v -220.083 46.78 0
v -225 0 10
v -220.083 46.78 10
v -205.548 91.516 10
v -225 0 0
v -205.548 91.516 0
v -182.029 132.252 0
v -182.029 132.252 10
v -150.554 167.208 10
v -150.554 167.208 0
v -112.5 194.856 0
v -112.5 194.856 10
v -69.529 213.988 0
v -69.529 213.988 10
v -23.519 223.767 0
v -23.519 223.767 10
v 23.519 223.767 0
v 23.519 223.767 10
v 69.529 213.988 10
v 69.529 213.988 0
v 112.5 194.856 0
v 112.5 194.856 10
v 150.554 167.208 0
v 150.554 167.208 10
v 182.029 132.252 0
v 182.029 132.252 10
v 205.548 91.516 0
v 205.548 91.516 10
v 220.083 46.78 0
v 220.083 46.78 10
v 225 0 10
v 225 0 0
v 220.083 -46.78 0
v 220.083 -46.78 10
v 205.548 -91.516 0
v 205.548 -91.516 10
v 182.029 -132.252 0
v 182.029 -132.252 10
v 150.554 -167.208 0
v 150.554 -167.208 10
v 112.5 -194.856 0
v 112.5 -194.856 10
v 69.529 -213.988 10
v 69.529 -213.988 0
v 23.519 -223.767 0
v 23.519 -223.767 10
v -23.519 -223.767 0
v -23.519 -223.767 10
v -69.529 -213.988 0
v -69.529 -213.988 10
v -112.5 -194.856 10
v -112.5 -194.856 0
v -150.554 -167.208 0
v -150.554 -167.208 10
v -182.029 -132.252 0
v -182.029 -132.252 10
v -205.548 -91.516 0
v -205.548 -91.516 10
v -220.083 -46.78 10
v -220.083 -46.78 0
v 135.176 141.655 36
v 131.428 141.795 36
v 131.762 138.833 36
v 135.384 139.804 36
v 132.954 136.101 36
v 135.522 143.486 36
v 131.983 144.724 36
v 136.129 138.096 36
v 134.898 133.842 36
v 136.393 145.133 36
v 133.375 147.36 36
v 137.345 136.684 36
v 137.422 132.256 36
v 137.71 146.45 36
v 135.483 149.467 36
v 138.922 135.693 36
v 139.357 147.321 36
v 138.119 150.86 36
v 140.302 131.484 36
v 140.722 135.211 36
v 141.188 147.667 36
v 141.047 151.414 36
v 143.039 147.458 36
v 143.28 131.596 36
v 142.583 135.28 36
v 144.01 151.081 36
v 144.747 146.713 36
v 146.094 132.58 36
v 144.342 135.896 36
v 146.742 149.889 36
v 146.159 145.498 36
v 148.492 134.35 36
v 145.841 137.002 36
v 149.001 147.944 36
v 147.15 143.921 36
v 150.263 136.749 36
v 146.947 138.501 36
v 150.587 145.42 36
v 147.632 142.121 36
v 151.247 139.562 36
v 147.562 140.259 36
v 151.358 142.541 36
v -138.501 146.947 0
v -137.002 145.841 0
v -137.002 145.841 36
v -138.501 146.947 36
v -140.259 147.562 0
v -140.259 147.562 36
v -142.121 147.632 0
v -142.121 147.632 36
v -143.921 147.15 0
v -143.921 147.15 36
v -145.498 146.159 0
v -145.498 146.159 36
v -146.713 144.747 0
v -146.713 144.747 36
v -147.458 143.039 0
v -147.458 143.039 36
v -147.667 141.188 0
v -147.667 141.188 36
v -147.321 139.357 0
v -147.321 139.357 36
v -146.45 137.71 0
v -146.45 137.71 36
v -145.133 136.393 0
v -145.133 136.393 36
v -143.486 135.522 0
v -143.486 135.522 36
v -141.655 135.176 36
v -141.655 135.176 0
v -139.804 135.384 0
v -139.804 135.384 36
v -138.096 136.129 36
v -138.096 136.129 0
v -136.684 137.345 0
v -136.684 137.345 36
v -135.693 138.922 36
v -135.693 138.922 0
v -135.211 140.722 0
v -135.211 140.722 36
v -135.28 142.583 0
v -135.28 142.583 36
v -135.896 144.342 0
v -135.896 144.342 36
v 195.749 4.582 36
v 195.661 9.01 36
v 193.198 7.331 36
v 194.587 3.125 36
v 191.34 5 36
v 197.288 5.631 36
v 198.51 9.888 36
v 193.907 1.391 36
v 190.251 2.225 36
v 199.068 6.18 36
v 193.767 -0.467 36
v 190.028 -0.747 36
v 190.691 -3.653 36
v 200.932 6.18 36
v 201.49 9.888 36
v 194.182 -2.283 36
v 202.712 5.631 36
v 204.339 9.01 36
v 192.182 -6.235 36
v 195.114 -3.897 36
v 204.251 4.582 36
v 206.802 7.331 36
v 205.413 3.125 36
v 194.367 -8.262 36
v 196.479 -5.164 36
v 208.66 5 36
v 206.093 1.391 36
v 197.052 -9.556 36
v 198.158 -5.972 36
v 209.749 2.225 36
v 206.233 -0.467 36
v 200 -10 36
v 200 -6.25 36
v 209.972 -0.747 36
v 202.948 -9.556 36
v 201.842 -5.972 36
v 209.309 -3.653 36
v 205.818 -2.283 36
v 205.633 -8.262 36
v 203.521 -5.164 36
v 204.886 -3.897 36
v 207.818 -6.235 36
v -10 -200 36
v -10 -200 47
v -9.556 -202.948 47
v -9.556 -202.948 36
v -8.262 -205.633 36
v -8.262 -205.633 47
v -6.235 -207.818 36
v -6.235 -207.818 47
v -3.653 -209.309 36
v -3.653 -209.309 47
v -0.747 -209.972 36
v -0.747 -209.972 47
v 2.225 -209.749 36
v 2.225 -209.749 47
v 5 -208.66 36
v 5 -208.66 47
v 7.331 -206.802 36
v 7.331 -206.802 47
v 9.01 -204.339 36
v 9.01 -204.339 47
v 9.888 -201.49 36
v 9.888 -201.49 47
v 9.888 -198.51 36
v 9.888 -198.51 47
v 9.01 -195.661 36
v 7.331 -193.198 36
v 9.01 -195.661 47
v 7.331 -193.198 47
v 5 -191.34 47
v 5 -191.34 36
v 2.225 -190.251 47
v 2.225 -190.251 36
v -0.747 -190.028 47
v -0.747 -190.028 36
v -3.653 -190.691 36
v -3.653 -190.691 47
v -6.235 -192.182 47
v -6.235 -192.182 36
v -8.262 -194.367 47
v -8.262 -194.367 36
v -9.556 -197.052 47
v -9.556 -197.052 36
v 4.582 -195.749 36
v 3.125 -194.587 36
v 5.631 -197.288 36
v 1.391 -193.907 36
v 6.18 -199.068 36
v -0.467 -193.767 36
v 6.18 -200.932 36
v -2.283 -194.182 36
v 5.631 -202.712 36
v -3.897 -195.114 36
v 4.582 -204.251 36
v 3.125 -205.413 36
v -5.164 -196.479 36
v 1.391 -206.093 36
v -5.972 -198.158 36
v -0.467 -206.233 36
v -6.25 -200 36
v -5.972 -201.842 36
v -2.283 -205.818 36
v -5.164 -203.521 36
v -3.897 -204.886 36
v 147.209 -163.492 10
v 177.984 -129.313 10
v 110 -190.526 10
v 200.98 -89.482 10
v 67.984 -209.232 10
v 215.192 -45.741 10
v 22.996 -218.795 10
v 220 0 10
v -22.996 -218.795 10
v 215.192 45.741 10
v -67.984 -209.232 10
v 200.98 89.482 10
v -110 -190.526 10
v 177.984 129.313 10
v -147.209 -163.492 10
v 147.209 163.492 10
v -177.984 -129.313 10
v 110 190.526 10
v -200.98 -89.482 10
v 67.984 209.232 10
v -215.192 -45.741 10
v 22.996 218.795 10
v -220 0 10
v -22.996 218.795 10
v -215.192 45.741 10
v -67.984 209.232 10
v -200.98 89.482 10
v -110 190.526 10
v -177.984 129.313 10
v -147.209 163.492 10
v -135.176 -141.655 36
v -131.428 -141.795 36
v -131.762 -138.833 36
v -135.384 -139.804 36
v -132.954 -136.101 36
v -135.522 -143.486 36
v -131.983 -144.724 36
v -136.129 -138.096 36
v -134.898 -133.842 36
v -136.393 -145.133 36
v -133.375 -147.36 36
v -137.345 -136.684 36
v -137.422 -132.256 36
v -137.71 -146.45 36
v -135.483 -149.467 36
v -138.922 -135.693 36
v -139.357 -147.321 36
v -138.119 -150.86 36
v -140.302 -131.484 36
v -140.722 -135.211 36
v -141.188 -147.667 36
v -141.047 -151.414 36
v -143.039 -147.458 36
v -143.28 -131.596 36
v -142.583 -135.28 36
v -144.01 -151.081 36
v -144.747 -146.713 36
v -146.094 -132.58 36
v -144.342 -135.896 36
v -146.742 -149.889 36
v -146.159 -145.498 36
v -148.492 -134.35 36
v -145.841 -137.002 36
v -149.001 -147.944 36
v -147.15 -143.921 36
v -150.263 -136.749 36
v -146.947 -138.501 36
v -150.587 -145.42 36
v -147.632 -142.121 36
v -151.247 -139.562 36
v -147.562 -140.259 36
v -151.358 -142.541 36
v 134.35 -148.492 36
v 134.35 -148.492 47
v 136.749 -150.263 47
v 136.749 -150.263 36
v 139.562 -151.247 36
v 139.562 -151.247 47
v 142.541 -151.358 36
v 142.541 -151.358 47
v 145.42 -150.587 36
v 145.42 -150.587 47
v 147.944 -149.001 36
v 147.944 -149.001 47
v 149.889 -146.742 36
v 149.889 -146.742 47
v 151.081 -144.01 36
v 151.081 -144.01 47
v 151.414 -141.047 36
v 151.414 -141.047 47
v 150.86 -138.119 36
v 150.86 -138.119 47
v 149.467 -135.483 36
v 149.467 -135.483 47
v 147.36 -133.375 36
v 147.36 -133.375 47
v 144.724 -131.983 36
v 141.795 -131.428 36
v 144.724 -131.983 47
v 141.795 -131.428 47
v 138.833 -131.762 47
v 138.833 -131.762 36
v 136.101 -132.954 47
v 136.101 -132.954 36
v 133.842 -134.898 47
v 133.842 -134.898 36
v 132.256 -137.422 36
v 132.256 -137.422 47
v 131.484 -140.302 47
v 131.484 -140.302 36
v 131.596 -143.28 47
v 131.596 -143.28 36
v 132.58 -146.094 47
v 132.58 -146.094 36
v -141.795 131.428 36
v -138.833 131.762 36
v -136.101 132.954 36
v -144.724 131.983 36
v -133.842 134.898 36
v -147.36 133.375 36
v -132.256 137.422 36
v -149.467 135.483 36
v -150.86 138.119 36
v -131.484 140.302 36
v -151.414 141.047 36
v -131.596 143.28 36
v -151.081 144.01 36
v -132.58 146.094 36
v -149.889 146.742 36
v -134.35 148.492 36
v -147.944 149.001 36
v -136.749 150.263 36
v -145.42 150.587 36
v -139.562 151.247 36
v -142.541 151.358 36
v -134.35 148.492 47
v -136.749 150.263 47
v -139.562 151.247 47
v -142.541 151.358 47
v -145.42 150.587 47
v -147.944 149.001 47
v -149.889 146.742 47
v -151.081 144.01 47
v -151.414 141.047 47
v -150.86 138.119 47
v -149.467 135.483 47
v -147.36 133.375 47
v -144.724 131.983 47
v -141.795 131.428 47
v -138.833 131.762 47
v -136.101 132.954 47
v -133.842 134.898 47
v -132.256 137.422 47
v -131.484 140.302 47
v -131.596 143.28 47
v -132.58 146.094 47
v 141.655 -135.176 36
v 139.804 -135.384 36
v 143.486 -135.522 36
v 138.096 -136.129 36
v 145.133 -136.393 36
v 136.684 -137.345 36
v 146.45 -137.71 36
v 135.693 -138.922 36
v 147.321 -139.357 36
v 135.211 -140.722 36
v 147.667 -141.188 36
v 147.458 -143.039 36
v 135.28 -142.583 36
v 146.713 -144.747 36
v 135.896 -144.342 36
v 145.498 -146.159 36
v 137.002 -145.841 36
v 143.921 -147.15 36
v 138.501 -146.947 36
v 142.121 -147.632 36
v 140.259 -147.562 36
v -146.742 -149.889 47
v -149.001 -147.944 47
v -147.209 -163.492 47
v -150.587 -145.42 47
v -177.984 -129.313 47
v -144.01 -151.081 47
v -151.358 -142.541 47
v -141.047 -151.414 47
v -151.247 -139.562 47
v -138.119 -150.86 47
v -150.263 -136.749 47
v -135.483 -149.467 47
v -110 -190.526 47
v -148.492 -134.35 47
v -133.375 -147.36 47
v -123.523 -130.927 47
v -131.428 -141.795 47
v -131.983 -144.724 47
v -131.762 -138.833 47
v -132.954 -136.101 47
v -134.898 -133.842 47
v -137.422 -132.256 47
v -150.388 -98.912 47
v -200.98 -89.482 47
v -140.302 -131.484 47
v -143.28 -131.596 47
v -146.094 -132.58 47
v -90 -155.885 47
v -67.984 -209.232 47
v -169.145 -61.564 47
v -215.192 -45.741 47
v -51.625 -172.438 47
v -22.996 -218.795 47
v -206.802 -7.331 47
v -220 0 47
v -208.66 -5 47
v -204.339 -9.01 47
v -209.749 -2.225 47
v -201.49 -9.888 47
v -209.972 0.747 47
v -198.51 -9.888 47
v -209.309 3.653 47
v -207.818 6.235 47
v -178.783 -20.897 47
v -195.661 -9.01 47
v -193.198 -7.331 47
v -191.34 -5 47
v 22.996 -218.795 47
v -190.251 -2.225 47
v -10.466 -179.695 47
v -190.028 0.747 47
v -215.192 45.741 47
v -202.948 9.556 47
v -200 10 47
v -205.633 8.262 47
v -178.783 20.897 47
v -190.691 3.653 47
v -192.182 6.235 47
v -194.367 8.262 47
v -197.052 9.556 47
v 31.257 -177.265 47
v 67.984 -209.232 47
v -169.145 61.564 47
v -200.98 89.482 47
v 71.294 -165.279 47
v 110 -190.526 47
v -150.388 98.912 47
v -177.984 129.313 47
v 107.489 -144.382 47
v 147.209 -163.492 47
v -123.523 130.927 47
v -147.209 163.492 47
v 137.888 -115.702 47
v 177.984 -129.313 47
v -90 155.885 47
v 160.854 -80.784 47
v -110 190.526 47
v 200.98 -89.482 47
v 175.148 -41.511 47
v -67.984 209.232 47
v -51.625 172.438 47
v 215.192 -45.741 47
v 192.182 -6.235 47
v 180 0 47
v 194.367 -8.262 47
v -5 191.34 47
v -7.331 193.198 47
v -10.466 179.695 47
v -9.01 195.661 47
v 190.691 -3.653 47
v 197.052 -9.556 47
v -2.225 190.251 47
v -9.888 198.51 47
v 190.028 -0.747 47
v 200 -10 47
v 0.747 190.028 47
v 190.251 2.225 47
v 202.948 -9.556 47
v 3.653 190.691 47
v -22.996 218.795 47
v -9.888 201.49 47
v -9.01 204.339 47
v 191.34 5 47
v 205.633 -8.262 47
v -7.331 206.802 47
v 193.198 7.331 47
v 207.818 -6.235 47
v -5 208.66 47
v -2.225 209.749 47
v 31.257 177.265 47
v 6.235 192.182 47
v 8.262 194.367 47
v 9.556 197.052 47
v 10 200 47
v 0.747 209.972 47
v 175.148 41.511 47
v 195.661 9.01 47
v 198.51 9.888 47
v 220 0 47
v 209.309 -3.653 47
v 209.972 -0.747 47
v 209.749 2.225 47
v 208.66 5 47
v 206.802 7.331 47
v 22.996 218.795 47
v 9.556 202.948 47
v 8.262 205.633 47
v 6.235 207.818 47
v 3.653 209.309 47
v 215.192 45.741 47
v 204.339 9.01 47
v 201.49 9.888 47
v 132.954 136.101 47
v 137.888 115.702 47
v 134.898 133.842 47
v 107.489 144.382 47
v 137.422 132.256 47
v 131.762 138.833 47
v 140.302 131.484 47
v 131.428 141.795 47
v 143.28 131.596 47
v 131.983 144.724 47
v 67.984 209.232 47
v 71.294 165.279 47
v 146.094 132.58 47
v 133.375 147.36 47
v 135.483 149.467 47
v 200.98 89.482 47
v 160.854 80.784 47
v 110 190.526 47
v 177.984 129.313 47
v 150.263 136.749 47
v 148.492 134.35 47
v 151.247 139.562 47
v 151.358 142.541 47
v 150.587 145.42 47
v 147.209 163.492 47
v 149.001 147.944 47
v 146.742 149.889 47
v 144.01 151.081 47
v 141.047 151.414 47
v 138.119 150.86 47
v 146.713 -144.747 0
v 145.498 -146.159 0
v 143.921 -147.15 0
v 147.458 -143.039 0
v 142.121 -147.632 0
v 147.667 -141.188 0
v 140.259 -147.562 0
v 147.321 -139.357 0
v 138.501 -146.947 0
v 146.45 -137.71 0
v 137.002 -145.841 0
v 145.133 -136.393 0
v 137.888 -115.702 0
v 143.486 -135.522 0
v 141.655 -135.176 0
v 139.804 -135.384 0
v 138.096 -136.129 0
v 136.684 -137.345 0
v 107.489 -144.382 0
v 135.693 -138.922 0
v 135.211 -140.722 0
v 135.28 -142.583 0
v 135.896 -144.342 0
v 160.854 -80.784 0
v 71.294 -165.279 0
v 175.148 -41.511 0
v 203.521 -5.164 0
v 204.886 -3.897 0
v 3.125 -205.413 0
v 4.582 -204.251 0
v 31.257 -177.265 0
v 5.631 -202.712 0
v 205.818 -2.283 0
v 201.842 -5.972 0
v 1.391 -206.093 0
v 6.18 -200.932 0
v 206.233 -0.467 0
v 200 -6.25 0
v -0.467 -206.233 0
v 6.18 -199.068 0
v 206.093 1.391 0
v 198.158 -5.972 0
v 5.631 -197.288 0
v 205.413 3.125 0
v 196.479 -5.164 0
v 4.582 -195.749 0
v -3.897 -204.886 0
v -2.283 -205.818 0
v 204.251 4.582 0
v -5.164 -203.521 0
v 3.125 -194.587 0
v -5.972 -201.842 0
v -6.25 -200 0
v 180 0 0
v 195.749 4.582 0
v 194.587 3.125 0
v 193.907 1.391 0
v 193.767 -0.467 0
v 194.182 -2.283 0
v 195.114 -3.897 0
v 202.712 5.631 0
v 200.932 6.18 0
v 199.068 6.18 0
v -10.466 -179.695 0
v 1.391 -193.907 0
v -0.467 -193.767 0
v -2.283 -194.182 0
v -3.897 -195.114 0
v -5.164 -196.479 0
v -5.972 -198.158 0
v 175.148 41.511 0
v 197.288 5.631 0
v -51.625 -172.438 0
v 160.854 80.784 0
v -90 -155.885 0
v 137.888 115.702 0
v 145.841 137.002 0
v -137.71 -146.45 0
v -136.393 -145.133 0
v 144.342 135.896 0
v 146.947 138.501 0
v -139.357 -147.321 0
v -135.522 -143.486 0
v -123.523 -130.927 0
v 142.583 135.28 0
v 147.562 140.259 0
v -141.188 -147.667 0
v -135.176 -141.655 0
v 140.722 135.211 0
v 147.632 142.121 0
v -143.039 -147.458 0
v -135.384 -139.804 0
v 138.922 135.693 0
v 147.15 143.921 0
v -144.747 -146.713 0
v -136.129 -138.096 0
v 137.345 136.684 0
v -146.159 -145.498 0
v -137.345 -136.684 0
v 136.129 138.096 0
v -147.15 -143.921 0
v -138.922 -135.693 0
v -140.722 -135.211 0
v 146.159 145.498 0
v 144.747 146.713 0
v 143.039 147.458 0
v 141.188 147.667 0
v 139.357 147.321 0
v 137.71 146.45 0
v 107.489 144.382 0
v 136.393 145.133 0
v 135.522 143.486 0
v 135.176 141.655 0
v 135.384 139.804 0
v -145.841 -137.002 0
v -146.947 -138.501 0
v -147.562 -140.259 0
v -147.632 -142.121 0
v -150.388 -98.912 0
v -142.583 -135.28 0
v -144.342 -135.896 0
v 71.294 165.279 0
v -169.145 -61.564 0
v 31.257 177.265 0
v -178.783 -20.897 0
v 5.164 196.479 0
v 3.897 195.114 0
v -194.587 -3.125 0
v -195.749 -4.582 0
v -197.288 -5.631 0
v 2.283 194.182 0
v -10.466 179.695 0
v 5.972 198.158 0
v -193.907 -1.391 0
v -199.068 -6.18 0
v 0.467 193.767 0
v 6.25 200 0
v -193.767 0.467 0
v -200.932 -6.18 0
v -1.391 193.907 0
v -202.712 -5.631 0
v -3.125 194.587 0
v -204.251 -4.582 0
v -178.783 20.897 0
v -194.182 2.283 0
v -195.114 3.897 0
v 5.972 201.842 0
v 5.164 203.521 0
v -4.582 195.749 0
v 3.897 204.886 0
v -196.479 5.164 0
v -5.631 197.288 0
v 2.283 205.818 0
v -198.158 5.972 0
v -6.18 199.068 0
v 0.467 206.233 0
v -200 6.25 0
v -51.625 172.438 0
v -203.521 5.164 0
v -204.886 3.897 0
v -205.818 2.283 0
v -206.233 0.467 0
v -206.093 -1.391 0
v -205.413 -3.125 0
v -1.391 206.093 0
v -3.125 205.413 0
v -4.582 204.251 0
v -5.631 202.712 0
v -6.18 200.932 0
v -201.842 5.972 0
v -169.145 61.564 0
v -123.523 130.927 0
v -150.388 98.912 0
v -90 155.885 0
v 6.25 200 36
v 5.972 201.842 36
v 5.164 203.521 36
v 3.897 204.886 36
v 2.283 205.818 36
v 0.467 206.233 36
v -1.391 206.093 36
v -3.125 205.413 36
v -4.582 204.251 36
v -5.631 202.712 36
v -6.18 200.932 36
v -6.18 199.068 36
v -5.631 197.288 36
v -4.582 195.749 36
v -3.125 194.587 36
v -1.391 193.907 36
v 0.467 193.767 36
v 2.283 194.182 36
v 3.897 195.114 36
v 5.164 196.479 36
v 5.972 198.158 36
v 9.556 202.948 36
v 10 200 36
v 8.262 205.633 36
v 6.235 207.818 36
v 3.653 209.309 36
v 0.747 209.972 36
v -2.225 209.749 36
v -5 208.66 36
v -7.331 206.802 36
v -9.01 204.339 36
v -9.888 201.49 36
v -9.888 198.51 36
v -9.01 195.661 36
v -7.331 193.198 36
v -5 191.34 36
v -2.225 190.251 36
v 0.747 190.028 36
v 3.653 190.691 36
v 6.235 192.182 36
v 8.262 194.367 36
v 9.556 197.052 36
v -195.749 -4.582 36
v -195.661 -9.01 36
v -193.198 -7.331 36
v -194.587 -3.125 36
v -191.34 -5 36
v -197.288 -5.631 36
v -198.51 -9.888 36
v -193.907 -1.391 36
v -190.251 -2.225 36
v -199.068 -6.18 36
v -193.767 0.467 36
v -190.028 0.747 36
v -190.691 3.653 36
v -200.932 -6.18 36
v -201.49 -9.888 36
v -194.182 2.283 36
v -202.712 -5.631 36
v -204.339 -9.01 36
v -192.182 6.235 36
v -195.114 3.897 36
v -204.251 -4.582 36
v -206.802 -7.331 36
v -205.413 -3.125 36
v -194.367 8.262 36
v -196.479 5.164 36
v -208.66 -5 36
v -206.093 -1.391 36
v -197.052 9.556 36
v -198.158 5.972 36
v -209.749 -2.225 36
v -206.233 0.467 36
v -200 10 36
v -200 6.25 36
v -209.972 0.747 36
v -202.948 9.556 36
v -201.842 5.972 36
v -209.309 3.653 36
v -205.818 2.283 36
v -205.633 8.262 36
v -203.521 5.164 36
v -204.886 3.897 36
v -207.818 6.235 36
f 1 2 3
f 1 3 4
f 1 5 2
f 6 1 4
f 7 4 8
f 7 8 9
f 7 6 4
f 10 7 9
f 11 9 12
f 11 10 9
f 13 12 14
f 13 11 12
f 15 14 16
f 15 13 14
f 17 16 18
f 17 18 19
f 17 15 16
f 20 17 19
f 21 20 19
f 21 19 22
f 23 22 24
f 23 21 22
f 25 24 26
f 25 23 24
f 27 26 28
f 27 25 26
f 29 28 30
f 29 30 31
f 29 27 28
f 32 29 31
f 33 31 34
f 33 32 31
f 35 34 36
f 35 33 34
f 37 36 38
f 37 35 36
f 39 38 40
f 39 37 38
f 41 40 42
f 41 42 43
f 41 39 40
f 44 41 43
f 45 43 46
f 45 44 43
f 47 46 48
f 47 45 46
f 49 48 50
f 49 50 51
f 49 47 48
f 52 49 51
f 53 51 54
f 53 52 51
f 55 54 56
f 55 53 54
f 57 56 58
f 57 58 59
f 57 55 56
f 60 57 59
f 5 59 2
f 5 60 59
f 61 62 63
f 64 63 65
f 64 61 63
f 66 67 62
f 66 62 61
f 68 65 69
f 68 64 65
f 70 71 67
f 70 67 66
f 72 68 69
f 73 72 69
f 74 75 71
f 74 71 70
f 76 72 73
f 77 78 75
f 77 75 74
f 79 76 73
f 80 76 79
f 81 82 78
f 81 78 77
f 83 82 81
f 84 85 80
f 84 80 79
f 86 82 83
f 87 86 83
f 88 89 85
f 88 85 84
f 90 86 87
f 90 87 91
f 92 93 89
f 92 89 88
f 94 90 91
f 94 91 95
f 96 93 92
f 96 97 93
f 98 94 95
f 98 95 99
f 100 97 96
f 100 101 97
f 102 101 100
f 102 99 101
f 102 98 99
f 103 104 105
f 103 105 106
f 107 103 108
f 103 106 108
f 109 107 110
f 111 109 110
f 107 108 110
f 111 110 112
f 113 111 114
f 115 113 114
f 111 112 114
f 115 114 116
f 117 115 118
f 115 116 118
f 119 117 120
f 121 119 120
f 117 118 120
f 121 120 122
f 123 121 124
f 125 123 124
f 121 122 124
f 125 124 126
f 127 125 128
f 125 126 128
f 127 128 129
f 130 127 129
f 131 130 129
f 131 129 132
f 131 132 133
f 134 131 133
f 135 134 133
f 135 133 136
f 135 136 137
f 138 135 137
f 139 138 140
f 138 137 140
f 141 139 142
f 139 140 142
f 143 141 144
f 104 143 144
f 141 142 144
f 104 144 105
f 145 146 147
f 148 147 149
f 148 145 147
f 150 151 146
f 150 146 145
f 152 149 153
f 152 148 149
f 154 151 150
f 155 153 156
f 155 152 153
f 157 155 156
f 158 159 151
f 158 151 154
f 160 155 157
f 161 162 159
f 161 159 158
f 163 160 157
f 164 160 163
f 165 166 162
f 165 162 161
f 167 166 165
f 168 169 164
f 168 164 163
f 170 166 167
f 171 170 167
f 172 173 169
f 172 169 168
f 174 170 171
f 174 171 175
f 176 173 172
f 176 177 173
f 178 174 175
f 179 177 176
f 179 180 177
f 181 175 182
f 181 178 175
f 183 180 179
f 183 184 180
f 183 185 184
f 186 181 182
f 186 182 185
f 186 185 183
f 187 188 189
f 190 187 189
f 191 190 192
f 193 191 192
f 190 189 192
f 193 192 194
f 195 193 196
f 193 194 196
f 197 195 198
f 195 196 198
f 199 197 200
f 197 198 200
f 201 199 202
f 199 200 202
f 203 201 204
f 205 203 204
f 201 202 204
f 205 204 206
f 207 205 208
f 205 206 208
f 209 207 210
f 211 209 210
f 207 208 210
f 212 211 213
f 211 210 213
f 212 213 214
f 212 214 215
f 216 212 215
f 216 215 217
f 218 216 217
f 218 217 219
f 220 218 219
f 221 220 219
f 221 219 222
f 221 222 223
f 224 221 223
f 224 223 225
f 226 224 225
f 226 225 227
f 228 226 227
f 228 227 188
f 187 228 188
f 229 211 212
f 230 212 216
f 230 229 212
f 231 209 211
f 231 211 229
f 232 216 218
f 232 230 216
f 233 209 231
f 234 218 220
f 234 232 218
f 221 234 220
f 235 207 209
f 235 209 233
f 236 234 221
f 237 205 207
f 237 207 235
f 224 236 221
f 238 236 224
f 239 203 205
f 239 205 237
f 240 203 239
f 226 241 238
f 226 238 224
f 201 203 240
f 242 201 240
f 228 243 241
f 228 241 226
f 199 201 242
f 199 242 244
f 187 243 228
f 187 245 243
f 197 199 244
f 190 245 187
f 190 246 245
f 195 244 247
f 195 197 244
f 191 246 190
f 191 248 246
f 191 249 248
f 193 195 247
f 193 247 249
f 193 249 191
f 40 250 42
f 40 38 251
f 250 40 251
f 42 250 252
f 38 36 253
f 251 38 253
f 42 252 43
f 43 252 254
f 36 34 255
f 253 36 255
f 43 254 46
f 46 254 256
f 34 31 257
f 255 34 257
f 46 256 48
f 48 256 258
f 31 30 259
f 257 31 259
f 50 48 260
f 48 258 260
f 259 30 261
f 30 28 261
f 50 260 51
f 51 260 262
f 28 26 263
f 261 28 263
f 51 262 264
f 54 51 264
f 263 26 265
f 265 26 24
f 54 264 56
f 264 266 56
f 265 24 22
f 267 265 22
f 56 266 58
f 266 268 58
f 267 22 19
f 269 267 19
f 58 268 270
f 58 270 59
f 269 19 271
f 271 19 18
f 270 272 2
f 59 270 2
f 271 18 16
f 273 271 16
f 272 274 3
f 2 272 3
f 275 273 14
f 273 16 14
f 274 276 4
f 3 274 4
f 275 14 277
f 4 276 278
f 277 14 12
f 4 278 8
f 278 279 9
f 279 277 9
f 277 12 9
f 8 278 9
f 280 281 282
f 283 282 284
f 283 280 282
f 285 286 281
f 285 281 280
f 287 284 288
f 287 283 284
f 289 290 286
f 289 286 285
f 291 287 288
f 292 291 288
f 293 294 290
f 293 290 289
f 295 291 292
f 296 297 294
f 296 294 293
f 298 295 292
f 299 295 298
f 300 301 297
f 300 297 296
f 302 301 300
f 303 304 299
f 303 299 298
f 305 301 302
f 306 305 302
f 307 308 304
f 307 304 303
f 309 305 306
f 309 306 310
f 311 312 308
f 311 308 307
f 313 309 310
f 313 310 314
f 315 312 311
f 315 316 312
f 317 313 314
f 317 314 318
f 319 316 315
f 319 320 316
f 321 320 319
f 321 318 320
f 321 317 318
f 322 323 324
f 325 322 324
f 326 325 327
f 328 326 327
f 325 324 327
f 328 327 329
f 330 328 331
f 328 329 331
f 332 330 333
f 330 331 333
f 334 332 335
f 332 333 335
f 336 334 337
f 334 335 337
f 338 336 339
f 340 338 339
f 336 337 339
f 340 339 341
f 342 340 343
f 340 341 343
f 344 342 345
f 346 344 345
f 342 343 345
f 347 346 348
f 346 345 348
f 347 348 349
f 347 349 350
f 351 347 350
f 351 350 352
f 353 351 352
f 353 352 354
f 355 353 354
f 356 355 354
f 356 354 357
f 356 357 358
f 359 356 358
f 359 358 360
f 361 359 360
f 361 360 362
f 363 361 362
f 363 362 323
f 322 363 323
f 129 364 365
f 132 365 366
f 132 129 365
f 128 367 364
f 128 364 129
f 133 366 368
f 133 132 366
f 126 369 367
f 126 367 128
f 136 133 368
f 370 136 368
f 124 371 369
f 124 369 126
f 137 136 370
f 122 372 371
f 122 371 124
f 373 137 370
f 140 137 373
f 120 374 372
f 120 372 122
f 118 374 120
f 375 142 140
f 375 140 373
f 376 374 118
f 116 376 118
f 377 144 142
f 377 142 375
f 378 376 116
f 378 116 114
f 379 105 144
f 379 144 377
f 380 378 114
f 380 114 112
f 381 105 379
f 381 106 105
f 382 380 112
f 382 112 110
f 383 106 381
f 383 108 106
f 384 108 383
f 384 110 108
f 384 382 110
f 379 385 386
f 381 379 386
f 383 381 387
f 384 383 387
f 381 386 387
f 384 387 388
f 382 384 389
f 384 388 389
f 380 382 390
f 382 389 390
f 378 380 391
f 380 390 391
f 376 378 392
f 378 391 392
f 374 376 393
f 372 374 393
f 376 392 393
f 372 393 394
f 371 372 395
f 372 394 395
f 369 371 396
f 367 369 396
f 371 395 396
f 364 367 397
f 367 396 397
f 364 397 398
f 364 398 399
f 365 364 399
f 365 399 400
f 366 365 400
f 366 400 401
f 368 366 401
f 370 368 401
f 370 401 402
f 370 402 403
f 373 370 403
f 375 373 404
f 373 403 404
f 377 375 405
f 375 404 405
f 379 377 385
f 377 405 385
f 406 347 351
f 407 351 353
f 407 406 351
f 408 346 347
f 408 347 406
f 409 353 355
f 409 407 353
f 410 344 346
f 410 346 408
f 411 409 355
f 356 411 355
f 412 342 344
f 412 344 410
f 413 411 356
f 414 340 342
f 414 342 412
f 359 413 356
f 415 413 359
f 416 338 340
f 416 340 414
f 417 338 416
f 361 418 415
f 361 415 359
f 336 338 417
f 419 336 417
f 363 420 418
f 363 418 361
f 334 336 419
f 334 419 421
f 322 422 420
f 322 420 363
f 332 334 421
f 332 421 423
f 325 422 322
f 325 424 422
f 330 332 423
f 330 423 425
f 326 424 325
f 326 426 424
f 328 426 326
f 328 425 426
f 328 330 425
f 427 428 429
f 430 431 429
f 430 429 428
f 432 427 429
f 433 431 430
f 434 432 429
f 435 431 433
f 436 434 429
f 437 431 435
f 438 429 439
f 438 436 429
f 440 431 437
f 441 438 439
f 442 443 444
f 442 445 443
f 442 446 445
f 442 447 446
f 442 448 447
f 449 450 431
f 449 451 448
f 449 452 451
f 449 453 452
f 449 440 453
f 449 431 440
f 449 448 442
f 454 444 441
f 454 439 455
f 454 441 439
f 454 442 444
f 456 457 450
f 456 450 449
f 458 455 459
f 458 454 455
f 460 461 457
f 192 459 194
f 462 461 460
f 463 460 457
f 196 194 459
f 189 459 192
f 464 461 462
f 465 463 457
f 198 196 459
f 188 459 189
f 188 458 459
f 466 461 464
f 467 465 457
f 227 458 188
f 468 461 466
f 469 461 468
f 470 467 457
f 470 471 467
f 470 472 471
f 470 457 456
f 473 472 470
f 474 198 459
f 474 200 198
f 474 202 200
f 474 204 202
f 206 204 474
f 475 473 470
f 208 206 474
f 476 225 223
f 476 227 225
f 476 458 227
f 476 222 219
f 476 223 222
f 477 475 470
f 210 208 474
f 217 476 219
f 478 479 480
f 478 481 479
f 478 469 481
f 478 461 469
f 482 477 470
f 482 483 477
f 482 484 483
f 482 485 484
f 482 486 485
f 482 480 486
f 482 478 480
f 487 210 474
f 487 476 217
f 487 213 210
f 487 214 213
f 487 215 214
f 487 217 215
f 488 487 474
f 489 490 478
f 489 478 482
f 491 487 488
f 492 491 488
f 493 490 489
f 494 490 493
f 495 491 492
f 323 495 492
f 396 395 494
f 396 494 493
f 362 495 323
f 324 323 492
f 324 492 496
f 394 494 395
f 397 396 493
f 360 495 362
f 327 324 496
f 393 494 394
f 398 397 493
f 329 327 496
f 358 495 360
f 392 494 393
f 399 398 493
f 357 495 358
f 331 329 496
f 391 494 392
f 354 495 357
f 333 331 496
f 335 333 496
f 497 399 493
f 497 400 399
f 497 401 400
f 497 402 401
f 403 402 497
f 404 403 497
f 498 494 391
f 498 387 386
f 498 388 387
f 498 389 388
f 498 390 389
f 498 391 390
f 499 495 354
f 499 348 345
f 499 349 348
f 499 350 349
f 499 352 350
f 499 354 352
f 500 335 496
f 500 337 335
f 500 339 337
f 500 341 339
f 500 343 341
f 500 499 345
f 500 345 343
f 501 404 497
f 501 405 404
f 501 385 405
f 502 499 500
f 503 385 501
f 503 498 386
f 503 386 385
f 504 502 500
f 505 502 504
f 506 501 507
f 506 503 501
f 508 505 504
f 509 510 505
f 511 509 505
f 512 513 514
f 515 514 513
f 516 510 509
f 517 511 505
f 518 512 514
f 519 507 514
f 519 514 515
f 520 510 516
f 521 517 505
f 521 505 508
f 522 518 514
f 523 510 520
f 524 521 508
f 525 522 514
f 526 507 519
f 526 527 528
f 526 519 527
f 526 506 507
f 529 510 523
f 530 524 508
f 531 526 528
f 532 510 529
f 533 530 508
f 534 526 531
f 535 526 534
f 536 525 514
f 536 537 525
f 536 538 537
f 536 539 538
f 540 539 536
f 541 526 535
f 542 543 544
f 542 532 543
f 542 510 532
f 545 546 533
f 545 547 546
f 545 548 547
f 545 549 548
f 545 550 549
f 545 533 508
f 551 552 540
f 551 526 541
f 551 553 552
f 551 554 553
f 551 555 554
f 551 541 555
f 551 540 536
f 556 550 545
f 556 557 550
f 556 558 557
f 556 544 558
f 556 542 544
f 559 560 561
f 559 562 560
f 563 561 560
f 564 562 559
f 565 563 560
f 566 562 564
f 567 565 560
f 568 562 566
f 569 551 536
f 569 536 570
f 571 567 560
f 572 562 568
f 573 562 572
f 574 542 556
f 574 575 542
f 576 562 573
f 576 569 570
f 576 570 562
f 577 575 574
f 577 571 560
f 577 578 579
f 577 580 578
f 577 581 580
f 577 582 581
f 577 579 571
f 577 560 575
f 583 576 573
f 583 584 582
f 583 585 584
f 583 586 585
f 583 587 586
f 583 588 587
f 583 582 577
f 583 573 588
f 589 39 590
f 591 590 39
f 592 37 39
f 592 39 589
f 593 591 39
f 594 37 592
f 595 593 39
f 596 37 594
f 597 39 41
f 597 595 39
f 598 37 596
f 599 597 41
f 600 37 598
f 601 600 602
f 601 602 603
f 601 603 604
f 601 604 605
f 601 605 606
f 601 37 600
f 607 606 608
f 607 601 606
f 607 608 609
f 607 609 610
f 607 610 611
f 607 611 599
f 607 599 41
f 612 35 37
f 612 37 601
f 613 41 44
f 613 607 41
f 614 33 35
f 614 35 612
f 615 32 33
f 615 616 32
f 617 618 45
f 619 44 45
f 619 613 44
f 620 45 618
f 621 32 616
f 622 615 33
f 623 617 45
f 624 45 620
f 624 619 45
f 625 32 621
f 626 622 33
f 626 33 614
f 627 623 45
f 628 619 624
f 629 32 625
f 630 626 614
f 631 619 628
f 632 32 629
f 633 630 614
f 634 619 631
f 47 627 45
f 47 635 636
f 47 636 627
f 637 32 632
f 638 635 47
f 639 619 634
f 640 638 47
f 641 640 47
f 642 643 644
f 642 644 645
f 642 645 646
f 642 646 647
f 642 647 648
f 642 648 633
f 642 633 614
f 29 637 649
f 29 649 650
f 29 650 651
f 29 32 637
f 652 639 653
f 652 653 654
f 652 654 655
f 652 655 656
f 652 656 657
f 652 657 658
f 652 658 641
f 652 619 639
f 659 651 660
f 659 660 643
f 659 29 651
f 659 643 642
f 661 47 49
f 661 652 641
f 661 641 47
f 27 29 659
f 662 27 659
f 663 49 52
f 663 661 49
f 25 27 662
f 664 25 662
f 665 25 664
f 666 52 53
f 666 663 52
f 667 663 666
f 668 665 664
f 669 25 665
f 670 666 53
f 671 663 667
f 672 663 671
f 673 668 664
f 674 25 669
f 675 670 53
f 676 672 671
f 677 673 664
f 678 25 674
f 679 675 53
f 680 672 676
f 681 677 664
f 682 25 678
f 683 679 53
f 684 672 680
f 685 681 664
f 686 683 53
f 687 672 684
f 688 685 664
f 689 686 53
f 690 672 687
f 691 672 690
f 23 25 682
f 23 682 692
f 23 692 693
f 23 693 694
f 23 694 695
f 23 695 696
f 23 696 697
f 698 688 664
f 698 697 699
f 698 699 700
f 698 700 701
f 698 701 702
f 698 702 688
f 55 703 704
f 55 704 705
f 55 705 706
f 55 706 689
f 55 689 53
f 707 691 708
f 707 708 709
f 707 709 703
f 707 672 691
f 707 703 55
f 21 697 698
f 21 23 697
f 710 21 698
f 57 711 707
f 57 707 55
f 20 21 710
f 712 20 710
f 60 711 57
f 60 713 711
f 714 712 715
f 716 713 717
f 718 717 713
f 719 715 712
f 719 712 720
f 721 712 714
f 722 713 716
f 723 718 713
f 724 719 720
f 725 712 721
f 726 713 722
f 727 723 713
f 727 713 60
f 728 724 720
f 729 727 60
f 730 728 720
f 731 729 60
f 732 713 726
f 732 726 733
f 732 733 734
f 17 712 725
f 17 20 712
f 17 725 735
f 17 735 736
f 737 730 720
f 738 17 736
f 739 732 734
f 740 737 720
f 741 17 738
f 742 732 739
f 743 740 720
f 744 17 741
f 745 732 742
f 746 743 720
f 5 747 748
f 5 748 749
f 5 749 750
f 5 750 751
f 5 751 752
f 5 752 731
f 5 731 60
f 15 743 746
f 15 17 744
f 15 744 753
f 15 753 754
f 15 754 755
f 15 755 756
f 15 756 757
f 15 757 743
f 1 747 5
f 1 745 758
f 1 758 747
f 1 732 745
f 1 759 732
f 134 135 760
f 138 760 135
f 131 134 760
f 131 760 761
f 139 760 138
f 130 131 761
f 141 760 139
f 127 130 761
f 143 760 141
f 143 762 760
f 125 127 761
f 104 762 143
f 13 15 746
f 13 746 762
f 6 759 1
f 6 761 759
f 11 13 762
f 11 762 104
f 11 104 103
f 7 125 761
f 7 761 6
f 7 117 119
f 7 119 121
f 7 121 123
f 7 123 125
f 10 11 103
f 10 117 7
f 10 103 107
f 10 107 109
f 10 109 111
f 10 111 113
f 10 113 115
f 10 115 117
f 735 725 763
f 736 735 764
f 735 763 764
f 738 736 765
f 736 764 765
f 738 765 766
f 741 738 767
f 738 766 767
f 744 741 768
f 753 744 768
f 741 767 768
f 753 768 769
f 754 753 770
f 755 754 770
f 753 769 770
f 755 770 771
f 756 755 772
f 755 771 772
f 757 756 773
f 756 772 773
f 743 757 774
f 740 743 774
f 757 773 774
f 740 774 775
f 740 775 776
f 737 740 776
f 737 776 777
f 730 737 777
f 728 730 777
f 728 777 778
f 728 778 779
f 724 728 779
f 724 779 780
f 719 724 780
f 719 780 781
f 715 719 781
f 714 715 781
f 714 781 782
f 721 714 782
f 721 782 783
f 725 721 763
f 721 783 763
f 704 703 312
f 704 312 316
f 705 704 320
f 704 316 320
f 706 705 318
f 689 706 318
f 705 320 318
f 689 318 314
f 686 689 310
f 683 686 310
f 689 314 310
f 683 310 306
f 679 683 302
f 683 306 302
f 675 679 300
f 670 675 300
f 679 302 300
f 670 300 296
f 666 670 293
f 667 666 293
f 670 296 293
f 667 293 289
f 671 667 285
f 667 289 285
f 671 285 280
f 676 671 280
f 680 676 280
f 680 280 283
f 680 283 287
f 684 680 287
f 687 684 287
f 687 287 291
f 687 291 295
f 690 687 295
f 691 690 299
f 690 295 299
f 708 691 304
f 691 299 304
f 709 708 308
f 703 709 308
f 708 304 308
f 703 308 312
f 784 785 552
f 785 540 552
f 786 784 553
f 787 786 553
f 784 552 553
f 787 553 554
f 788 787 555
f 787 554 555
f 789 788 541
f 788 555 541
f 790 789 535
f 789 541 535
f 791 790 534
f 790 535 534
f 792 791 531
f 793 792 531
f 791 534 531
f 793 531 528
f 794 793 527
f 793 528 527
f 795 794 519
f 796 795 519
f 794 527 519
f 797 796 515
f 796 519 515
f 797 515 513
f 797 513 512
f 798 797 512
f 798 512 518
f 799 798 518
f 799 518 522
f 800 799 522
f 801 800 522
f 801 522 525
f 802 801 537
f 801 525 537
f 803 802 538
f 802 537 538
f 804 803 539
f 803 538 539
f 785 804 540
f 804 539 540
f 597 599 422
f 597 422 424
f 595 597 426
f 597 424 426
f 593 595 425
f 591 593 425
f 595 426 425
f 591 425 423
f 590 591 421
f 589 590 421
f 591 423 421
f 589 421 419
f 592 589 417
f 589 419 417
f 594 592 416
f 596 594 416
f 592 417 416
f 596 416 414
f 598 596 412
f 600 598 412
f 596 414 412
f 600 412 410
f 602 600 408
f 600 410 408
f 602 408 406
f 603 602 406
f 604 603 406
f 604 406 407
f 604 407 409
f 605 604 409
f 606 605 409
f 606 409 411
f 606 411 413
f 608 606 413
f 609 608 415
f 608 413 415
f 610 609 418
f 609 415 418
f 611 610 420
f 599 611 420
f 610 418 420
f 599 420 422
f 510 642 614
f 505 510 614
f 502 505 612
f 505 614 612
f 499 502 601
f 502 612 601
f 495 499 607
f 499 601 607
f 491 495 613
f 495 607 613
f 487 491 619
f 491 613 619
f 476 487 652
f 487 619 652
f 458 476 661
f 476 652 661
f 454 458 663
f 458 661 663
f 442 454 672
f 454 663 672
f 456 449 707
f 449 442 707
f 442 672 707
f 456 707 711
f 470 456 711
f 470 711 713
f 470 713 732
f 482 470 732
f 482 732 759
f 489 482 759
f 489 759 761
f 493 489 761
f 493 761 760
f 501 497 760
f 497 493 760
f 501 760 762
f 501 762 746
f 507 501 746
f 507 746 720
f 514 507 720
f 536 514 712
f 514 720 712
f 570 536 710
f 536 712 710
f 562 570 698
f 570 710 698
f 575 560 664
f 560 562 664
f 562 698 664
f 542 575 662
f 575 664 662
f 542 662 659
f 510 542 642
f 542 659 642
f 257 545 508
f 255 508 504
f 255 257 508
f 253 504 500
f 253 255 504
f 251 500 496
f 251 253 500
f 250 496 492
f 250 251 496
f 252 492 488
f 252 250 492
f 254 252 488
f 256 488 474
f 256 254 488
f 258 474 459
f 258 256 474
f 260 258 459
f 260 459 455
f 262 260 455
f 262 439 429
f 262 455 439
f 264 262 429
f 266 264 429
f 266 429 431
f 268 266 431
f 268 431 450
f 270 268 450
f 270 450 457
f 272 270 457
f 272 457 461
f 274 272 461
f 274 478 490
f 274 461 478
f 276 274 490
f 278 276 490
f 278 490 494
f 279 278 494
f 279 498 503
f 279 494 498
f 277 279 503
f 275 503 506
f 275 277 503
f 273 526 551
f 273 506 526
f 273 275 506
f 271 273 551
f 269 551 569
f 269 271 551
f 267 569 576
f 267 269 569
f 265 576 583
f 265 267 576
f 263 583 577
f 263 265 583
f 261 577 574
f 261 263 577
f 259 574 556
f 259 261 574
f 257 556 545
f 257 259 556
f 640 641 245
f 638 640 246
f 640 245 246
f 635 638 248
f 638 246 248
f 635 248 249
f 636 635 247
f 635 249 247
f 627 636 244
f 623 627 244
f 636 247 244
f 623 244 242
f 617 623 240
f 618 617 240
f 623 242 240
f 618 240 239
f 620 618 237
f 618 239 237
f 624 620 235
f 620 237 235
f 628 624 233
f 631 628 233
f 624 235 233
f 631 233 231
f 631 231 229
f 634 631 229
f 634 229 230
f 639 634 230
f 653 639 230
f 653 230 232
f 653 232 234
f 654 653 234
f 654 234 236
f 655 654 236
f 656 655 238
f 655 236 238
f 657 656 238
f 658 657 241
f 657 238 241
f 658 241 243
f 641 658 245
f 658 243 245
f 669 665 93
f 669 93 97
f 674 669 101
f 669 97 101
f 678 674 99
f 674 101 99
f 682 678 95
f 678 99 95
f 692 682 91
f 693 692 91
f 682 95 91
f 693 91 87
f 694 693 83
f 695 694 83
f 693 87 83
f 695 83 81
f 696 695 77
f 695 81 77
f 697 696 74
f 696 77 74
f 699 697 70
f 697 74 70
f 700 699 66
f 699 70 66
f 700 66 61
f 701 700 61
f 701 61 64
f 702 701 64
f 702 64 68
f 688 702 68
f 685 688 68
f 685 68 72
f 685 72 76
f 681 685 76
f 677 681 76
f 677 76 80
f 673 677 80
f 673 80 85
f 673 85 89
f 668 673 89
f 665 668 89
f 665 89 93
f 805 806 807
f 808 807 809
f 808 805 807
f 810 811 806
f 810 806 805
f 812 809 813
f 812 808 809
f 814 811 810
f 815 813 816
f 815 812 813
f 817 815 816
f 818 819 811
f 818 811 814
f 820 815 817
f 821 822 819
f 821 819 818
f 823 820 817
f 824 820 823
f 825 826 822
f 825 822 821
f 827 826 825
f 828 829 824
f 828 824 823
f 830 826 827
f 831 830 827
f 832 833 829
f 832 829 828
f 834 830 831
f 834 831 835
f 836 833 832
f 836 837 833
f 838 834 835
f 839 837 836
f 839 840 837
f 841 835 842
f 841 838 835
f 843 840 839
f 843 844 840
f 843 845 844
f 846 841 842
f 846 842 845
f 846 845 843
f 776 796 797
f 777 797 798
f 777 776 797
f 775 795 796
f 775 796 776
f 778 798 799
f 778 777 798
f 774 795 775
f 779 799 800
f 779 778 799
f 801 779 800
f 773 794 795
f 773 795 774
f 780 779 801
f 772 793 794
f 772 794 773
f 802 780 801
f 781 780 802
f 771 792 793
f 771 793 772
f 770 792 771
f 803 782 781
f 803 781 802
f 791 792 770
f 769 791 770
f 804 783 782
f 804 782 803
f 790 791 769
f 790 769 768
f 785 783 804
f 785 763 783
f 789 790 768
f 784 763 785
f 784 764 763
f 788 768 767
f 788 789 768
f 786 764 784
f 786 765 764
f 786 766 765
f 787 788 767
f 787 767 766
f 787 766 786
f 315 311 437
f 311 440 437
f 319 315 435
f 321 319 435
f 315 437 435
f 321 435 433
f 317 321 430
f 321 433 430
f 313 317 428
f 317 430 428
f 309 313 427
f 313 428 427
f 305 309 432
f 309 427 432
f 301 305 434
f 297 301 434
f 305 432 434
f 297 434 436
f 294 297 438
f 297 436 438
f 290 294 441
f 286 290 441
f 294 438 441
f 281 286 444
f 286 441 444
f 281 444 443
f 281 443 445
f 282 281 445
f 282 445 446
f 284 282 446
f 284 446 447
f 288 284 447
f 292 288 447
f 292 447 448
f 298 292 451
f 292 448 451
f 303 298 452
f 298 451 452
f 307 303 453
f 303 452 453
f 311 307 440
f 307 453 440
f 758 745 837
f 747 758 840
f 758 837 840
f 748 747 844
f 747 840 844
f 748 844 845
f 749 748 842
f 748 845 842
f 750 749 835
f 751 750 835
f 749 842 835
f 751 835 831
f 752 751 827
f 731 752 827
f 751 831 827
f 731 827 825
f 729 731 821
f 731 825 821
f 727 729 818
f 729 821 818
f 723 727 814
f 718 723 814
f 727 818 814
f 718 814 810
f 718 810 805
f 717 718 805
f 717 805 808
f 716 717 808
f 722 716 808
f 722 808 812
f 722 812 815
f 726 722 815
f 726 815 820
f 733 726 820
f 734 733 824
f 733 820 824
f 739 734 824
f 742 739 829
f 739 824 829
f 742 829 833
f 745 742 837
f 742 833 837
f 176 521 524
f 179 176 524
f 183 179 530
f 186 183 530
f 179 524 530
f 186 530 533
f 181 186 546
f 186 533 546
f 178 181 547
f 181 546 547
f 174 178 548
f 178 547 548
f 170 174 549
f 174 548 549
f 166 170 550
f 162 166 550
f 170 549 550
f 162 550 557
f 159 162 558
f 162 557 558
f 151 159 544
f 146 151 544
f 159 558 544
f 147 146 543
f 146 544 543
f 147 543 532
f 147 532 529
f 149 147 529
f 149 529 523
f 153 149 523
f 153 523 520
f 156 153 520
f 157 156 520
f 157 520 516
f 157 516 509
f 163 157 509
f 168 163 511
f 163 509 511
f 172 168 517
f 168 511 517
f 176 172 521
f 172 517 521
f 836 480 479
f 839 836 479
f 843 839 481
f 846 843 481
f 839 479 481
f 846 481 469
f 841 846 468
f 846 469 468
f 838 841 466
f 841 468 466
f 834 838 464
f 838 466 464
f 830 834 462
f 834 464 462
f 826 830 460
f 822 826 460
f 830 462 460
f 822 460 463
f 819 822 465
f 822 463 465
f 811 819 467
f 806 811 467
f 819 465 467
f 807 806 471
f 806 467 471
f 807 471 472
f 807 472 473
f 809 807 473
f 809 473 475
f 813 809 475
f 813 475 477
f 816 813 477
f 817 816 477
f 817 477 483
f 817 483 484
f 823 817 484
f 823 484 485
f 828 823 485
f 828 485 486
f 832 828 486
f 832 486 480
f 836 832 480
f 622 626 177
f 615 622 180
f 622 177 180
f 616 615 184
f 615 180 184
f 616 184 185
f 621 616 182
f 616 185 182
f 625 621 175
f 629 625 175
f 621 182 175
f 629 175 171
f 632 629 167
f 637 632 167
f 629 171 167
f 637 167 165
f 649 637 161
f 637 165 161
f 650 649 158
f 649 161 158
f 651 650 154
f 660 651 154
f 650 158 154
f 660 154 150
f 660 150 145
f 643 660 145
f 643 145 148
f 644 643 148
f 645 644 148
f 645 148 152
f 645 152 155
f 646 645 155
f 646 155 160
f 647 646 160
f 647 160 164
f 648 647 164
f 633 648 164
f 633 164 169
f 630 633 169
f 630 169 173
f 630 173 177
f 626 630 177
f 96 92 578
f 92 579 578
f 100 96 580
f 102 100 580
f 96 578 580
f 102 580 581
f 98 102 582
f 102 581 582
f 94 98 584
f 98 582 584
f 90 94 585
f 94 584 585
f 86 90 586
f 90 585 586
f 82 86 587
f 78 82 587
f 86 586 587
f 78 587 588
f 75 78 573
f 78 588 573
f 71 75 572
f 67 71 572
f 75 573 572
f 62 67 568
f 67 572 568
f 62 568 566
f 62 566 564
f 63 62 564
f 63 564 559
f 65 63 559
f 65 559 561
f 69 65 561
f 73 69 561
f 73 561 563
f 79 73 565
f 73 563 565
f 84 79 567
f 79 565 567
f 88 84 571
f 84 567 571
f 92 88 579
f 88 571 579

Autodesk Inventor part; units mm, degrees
ref_plane "YZ Plane" through (0, 0, 0) normal (1, 0, 0) x (0, 1, 0)
ref_plane "XZ Plane" through (0, 0, 0) normal (0, 1, 0) x (-1, 0, 0)
ref_plane "XY Plane" through (0, 0, 0) normal (0, 0, 1) x (1, 0, 0)
sketch "Sketch1" plane through (0, 0, 0) normal (0, 0, 1) x (1, 0, 0)
  circle A0 centre (0, 0) radius 180
  circle A1 centre (0, 0) radius 220
  dimension "d0" = 40
  dimension "d1" = 360
extrude "Extrusion1" add sketch "Sketch1" along normal blind 47
sketch "Sketch2" plane through (0, 0, 47) normal (0, 0, 1) x (1, 0, 0)
  circle A0 centre (0, 0) radius 220 construction
  circle A1 centre (0, 0) radius 180 construction
  line L0 (0, 220) -> (0, 180) construction
  circle A2 centre (0, 200) radius 6.25
  dimension "d4" = 12.5
extrude "Extrusion2" cut sketch "Sketch2" against normal through all
sketch "Sketch3" plane through (0, 0, 47) normal (0, 0, 1) x (1, 0, 0)
  circle A0 centre (0, 200) radius 6.25 projected
  circle A1 centre (0, 200) radius 10
  point P0 (0, 0)
  dimension "d10" = 20
extrude "Extrusion3" cut sketch "Sketch3" against normal blind 11
pattern_circular "Circular Pattern1" count 8 over 360 about axis through (0, 0, 0) along (0, 0, 1) of "Extrusion2", "Extrusion3"
sketch "Sketch4" plane through (0, 0, 0) normal (0, 0, -1) x (-1, 0, 0)
  circle A0 centre (0, 0) radius 220 projected
  circle A1 centre (0, 0) radius 225
  dimension "d13" = 5
extrude "Extrusion4" add sketch "Sketch4" against normal blind 10
equation "\"d1\" = Вал_ось_диаметр_КОРМА"
equation "\"d2\" = Барабан_толщина_посад_кольца"
equation "\"Вал_ось_диаметр_КОРМА\" = 360"
equation "\"Барабан_толщина_посад_кольца\" = 47"
properties part number "ДМС 103 Опорное кольцо вала хвост ПВГ.ipt"
